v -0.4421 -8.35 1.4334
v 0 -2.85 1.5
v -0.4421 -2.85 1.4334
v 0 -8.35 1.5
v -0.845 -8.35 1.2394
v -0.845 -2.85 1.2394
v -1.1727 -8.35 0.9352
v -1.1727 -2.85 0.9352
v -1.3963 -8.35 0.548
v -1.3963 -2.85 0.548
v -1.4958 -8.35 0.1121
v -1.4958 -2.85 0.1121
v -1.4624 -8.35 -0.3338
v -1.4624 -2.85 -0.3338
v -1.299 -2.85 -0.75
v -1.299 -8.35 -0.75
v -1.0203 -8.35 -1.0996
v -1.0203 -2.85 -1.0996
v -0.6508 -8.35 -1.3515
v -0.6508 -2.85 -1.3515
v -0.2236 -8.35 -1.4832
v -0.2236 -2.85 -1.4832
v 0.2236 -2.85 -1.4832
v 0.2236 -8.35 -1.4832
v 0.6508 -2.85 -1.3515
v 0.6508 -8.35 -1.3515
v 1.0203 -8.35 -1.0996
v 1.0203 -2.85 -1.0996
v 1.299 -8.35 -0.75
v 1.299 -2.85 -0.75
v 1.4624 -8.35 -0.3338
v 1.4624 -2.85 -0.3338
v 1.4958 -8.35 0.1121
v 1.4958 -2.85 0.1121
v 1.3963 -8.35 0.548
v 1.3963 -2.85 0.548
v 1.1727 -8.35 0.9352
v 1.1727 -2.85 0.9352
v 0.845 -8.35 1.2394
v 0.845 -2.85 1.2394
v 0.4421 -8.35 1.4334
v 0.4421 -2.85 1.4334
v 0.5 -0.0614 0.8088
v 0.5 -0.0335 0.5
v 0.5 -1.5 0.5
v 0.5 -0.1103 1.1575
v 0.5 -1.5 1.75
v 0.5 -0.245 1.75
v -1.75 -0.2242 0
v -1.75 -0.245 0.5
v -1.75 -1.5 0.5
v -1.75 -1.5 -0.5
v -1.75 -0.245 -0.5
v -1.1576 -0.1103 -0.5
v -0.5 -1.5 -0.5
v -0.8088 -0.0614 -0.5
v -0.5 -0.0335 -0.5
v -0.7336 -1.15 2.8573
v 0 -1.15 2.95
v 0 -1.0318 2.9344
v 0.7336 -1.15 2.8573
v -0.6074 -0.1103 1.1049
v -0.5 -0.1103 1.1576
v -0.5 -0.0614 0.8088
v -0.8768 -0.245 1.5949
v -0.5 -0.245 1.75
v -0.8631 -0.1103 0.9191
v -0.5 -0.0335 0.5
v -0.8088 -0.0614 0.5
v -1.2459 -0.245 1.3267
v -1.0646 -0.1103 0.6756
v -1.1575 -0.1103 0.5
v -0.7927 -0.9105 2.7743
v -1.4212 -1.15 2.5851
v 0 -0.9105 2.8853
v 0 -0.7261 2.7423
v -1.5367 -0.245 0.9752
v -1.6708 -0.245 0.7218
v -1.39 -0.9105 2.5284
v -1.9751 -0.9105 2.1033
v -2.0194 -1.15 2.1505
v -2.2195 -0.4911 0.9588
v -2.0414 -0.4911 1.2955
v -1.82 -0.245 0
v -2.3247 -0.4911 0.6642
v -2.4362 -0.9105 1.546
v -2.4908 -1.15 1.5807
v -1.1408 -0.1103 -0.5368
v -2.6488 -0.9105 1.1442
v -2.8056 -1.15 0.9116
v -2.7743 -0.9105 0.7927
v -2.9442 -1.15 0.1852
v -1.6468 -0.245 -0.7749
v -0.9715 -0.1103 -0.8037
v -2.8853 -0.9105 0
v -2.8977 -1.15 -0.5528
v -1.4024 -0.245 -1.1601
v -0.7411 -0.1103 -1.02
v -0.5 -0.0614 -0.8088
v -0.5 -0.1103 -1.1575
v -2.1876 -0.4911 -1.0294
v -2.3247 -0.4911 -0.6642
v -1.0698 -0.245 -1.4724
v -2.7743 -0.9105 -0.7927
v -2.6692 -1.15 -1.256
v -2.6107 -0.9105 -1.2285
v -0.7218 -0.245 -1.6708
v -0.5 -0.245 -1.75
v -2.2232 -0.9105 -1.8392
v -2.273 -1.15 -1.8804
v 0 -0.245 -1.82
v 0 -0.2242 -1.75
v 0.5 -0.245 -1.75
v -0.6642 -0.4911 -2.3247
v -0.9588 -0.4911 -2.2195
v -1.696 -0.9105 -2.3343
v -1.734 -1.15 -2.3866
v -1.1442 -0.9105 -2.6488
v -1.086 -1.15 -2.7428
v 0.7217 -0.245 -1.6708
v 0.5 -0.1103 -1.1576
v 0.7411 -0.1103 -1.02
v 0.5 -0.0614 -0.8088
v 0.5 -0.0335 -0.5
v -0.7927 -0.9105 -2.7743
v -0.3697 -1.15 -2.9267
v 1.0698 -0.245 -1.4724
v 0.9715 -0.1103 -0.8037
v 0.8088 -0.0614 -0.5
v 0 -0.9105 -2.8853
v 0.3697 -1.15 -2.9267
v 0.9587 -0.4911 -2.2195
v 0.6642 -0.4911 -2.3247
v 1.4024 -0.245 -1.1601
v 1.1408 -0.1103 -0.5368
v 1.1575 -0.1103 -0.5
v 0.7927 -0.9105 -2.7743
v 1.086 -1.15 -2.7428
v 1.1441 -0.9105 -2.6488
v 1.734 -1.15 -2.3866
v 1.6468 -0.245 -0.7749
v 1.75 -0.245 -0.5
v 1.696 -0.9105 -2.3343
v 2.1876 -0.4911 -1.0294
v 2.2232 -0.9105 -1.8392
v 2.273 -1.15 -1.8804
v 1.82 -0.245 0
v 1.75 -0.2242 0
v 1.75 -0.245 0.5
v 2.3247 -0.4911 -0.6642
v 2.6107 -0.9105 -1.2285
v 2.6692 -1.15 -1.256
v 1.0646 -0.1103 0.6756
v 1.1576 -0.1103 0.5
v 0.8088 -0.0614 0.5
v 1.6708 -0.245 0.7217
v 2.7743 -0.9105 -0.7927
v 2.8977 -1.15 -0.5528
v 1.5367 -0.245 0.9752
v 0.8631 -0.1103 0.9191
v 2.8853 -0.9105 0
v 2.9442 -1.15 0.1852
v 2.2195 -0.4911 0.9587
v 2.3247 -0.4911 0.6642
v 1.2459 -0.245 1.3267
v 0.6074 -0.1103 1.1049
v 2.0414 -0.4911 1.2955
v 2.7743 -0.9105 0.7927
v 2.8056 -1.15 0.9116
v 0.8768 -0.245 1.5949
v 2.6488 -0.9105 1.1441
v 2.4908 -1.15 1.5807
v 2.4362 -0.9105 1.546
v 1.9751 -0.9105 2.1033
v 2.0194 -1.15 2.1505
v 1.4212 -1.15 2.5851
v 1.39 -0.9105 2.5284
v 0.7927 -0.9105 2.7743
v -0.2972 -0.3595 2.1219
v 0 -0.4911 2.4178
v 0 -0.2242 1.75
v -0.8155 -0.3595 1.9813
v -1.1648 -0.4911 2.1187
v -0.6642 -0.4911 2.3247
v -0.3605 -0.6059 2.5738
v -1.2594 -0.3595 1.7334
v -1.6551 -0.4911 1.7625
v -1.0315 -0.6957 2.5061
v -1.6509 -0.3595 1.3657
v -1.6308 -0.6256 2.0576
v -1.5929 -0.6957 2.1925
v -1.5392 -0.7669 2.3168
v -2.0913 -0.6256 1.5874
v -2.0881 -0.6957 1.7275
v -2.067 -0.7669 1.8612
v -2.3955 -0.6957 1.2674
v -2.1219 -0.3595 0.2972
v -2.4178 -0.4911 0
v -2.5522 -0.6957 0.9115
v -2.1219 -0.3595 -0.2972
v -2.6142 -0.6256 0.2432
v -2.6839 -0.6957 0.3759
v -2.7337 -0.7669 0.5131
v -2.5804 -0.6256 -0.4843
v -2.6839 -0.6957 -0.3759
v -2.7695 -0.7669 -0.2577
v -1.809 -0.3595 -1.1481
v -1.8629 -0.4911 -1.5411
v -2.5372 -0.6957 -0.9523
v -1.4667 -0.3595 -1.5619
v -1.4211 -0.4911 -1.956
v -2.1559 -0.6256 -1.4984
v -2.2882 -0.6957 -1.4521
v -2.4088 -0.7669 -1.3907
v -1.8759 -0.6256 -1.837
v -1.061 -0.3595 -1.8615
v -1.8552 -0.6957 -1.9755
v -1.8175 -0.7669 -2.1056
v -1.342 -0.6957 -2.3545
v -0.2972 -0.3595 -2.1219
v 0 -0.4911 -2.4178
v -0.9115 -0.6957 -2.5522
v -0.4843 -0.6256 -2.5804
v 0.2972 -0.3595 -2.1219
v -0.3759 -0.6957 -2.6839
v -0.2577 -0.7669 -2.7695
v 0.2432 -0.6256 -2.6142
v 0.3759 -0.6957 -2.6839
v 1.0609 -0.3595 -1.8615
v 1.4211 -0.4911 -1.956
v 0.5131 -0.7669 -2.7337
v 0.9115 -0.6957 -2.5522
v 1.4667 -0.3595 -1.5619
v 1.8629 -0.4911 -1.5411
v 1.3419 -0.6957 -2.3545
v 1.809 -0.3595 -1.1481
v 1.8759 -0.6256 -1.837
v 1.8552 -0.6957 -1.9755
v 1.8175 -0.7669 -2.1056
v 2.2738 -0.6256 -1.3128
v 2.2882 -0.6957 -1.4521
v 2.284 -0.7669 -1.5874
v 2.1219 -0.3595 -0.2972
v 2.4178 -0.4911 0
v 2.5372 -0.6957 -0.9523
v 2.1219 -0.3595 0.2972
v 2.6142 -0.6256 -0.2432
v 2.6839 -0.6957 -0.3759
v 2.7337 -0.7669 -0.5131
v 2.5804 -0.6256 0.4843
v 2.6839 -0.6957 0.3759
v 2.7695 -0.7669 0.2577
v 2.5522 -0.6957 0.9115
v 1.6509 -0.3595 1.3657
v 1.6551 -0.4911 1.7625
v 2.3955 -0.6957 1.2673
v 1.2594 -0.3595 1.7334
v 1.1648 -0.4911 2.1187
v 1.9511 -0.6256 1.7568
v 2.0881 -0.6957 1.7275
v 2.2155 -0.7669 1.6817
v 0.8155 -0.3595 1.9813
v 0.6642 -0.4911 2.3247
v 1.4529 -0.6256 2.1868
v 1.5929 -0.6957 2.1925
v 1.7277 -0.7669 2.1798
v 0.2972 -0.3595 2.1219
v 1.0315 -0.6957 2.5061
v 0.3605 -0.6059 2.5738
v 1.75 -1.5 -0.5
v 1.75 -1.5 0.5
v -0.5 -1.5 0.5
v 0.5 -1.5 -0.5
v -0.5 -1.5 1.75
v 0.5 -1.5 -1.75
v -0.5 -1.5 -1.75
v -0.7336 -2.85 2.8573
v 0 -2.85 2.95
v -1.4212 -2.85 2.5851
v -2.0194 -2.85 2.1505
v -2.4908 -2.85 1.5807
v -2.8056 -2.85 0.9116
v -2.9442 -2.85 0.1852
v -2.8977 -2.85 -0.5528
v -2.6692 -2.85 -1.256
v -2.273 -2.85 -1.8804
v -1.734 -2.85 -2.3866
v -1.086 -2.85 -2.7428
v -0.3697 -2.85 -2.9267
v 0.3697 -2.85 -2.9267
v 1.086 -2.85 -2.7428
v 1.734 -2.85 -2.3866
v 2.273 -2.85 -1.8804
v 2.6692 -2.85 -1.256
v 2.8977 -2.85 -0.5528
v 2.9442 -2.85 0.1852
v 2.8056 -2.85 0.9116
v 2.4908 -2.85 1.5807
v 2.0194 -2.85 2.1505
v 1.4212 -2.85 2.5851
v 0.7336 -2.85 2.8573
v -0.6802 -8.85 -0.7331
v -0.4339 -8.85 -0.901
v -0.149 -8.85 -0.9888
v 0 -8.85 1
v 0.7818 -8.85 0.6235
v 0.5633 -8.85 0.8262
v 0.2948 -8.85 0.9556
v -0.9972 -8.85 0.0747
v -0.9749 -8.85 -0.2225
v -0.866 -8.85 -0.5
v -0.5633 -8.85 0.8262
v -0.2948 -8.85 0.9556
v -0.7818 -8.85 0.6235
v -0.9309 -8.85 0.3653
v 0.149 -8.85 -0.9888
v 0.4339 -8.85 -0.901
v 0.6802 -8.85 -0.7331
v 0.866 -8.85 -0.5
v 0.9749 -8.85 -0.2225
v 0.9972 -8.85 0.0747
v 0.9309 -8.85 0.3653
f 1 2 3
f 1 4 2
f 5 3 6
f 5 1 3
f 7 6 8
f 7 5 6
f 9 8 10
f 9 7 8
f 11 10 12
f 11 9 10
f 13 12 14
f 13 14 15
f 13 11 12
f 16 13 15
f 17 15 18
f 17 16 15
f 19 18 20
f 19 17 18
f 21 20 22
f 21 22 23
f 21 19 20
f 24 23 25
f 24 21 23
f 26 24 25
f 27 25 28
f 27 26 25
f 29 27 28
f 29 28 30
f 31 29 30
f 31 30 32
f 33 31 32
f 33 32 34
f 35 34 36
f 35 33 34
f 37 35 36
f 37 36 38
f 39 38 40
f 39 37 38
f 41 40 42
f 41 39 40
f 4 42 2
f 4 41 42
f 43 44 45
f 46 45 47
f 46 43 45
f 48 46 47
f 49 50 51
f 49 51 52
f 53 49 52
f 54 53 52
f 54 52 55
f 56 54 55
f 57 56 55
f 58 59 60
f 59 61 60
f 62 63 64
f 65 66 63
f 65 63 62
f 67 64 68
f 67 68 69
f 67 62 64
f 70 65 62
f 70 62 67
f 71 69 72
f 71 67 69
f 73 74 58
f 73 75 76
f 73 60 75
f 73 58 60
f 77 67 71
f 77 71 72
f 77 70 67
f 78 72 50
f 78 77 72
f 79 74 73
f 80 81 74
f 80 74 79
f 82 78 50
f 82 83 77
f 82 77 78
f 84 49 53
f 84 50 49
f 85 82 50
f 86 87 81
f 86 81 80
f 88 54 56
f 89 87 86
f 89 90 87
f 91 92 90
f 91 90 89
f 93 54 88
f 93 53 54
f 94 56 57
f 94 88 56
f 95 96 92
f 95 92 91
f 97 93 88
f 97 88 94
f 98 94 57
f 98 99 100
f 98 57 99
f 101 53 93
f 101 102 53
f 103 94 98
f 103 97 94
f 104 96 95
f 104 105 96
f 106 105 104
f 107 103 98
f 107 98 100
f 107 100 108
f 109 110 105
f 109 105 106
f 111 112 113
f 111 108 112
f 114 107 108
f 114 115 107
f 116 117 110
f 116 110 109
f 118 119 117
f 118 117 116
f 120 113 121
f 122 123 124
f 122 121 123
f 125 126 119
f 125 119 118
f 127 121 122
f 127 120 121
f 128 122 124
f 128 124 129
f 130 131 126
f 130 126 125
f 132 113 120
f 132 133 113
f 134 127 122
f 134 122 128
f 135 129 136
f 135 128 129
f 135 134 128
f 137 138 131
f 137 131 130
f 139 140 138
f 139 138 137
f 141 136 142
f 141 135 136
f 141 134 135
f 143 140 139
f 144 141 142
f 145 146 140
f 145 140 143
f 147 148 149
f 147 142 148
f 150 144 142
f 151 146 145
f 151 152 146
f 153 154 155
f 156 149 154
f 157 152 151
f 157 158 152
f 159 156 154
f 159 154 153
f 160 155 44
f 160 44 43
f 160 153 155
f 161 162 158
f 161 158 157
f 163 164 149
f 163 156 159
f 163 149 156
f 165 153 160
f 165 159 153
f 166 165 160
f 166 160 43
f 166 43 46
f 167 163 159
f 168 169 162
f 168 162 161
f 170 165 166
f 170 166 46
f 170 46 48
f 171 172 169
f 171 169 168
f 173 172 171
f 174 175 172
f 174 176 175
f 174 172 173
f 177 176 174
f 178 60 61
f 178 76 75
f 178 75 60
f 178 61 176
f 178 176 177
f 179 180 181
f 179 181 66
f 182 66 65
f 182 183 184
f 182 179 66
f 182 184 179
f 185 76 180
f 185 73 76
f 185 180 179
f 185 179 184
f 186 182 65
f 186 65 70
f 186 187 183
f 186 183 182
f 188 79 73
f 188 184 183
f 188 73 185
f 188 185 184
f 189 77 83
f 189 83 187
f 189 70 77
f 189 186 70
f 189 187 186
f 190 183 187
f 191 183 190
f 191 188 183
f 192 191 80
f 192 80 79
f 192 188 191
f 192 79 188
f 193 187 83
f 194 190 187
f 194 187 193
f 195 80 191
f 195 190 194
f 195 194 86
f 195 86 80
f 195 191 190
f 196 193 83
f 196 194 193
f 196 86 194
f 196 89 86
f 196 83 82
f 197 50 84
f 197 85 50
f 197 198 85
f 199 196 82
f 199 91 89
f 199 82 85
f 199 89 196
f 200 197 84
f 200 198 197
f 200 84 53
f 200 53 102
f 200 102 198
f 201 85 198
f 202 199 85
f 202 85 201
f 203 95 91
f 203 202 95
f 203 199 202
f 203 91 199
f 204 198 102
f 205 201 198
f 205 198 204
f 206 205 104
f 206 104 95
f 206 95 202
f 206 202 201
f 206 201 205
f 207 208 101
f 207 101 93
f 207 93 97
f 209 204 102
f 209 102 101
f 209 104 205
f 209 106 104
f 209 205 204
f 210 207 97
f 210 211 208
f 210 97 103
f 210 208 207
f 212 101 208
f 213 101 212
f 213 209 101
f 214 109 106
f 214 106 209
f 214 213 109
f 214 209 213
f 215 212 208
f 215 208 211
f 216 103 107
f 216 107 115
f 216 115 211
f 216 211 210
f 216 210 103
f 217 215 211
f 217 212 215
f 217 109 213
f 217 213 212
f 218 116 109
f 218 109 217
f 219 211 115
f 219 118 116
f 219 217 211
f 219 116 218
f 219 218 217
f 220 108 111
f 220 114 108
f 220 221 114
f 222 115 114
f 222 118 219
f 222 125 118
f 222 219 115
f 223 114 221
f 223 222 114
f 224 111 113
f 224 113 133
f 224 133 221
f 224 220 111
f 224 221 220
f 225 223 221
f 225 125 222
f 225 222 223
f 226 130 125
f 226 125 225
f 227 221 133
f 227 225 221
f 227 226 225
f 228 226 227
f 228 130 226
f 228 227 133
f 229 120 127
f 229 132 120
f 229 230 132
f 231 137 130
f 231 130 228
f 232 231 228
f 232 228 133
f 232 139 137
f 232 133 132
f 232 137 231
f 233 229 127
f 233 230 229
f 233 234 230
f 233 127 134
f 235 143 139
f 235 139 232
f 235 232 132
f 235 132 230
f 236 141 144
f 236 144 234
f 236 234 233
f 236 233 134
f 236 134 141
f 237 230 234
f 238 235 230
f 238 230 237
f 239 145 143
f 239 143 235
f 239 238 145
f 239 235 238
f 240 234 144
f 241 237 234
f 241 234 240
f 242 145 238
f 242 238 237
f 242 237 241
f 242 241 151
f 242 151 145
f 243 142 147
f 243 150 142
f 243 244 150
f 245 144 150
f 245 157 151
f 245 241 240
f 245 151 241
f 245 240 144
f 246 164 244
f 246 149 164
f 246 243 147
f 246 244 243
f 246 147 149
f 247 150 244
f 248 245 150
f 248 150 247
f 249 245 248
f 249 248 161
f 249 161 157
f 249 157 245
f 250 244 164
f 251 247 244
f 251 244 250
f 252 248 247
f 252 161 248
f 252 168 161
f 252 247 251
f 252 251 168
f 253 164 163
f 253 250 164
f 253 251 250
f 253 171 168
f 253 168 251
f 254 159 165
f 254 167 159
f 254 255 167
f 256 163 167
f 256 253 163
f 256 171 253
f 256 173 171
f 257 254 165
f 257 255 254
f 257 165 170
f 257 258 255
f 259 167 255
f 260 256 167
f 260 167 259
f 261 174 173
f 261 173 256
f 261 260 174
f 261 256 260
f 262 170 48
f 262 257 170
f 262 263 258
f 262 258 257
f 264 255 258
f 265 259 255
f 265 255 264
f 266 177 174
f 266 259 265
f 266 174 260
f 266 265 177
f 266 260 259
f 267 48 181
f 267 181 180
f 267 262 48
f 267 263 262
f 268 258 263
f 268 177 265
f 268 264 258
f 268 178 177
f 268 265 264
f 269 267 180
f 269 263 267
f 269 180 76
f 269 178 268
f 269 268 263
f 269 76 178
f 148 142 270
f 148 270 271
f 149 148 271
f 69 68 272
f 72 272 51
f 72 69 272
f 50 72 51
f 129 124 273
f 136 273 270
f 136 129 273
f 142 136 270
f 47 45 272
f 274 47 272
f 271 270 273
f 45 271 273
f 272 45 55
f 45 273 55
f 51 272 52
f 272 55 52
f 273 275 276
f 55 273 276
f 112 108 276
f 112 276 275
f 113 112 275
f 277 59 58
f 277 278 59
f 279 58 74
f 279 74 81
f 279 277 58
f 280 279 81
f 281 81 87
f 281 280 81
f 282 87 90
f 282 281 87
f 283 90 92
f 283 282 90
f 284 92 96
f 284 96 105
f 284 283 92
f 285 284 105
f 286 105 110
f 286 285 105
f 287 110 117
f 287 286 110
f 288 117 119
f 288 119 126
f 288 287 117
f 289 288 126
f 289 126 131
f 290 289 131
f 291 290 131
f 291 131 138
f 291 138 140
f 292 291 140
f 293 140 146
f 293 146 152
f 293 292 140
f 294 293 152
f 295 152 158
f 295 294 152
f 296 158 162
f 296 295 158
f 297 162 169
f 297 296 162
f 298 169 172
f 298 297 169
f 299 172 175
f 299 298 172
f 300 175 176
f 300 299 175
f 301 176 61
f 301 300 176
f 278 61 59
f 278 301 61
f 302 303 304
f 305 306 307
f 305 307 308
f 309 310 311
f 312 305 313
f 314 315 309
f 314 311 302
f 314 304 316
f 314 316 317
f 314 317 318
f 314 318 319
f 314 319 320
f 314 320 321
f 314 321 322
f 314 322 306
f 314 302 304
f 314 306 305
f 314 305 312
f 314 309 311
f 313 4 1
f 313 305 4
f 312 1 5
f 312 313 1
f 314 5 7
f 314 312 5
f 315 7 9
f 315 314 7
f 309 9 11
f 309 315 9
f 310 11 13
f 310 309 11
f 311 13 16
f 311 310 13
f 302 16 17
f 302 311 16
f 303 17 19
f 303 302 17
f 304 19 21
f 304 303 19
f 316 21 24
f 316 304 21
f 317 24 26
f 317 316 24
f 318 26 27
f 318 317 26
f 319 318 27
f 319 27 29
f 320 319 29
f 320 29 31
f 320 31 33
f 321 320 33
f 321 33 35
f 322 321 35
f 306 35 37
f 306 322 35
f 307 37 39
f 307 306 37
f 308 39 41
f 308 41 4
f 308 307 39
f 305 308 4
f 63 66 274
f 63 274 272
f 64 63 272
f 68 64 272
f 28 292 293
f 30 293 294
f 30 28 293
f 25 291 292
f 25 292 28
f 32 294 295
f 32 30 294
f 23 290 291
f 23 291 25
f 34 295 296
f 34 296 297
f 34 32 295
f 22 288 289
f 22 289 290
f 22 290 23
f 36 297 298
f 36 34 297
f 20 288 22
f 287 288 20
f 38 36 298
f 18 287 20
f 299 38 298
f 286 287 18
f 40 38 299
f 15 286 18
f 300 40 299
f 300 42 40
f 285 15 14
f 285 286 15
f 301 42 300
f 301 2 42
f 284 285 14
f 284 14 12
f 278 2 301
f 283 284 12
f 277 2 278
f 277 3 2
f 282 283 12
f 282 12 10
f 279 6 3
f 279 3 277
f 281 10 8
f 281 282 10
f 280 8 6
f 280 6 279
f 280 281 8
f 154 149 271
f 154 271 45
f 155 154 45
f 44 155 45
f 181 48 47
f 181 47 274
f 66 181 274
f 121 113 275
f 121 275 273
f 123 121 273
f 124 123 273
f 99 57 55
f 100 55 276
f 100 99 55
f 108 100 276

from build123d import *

# Parameters (mm, degrees)
CUT_EXTRUDE1_DEPTH = 1.5


with BuildPart() as part:
    # Sketch1 → Revolve1 (revolve)
    with BuildSketch(Plane.XY, mode=Mode.PRIVATE) as revolve1_sk:
        with BuildLine():
            Line((-1.5, -2.85), (-1.5, -8.35))
            Line((-1.5, -8.35), (-1, -8.85))
            Line((-1, -8.85), (0, -8.85))
            Line((0, -8.85), (0, 0))
            add(Edge.make_bspline(
                [(0, 0), (-2.95, 0), (-2.95, -1.15)],
                knots=[4.71238898, 4.71238898, 4.71238898, 6.283185307, 6.283185307, 6.283185307], degree=2, weights=[1, 0.707106781, 1]))
            Line((-2.95, -1.15), (-2.95, -2.85))
            Line((-2.95, -2.85), (-1.5, -2.85))
        make_face()
    revolve(revolve1_sk.sketch.rotate(Axis((0, 0, 0), (0, -1, 0)), 270), axis=Axis((0, 0, 0), (0, -1, 0)))

    # Sketch2 → Cut-Extrude1 (cut)
    with BuildSketch(Plane(origin=(0, 0, 0), x_dir=(1, 0, 0), z_dir=(0, 1, 0))):
        Polygon((-1.75, 0.5), (-0.5, 0.5), (-0.5, 1.75), (0.5, 1.75), (0.5, 0.5), (1.75, 0.5), (1.75, -0.5), (0.5, -0.5), (0.5, -1.75), (-0.5, -1.75), (-0.5, -0.5), (-1.75, -0.5), align=None)
    extrude(amount=-CUT_EXTRUDE1_DEPTH, mode=Mode.SUBTRACT)


solid = part.part
